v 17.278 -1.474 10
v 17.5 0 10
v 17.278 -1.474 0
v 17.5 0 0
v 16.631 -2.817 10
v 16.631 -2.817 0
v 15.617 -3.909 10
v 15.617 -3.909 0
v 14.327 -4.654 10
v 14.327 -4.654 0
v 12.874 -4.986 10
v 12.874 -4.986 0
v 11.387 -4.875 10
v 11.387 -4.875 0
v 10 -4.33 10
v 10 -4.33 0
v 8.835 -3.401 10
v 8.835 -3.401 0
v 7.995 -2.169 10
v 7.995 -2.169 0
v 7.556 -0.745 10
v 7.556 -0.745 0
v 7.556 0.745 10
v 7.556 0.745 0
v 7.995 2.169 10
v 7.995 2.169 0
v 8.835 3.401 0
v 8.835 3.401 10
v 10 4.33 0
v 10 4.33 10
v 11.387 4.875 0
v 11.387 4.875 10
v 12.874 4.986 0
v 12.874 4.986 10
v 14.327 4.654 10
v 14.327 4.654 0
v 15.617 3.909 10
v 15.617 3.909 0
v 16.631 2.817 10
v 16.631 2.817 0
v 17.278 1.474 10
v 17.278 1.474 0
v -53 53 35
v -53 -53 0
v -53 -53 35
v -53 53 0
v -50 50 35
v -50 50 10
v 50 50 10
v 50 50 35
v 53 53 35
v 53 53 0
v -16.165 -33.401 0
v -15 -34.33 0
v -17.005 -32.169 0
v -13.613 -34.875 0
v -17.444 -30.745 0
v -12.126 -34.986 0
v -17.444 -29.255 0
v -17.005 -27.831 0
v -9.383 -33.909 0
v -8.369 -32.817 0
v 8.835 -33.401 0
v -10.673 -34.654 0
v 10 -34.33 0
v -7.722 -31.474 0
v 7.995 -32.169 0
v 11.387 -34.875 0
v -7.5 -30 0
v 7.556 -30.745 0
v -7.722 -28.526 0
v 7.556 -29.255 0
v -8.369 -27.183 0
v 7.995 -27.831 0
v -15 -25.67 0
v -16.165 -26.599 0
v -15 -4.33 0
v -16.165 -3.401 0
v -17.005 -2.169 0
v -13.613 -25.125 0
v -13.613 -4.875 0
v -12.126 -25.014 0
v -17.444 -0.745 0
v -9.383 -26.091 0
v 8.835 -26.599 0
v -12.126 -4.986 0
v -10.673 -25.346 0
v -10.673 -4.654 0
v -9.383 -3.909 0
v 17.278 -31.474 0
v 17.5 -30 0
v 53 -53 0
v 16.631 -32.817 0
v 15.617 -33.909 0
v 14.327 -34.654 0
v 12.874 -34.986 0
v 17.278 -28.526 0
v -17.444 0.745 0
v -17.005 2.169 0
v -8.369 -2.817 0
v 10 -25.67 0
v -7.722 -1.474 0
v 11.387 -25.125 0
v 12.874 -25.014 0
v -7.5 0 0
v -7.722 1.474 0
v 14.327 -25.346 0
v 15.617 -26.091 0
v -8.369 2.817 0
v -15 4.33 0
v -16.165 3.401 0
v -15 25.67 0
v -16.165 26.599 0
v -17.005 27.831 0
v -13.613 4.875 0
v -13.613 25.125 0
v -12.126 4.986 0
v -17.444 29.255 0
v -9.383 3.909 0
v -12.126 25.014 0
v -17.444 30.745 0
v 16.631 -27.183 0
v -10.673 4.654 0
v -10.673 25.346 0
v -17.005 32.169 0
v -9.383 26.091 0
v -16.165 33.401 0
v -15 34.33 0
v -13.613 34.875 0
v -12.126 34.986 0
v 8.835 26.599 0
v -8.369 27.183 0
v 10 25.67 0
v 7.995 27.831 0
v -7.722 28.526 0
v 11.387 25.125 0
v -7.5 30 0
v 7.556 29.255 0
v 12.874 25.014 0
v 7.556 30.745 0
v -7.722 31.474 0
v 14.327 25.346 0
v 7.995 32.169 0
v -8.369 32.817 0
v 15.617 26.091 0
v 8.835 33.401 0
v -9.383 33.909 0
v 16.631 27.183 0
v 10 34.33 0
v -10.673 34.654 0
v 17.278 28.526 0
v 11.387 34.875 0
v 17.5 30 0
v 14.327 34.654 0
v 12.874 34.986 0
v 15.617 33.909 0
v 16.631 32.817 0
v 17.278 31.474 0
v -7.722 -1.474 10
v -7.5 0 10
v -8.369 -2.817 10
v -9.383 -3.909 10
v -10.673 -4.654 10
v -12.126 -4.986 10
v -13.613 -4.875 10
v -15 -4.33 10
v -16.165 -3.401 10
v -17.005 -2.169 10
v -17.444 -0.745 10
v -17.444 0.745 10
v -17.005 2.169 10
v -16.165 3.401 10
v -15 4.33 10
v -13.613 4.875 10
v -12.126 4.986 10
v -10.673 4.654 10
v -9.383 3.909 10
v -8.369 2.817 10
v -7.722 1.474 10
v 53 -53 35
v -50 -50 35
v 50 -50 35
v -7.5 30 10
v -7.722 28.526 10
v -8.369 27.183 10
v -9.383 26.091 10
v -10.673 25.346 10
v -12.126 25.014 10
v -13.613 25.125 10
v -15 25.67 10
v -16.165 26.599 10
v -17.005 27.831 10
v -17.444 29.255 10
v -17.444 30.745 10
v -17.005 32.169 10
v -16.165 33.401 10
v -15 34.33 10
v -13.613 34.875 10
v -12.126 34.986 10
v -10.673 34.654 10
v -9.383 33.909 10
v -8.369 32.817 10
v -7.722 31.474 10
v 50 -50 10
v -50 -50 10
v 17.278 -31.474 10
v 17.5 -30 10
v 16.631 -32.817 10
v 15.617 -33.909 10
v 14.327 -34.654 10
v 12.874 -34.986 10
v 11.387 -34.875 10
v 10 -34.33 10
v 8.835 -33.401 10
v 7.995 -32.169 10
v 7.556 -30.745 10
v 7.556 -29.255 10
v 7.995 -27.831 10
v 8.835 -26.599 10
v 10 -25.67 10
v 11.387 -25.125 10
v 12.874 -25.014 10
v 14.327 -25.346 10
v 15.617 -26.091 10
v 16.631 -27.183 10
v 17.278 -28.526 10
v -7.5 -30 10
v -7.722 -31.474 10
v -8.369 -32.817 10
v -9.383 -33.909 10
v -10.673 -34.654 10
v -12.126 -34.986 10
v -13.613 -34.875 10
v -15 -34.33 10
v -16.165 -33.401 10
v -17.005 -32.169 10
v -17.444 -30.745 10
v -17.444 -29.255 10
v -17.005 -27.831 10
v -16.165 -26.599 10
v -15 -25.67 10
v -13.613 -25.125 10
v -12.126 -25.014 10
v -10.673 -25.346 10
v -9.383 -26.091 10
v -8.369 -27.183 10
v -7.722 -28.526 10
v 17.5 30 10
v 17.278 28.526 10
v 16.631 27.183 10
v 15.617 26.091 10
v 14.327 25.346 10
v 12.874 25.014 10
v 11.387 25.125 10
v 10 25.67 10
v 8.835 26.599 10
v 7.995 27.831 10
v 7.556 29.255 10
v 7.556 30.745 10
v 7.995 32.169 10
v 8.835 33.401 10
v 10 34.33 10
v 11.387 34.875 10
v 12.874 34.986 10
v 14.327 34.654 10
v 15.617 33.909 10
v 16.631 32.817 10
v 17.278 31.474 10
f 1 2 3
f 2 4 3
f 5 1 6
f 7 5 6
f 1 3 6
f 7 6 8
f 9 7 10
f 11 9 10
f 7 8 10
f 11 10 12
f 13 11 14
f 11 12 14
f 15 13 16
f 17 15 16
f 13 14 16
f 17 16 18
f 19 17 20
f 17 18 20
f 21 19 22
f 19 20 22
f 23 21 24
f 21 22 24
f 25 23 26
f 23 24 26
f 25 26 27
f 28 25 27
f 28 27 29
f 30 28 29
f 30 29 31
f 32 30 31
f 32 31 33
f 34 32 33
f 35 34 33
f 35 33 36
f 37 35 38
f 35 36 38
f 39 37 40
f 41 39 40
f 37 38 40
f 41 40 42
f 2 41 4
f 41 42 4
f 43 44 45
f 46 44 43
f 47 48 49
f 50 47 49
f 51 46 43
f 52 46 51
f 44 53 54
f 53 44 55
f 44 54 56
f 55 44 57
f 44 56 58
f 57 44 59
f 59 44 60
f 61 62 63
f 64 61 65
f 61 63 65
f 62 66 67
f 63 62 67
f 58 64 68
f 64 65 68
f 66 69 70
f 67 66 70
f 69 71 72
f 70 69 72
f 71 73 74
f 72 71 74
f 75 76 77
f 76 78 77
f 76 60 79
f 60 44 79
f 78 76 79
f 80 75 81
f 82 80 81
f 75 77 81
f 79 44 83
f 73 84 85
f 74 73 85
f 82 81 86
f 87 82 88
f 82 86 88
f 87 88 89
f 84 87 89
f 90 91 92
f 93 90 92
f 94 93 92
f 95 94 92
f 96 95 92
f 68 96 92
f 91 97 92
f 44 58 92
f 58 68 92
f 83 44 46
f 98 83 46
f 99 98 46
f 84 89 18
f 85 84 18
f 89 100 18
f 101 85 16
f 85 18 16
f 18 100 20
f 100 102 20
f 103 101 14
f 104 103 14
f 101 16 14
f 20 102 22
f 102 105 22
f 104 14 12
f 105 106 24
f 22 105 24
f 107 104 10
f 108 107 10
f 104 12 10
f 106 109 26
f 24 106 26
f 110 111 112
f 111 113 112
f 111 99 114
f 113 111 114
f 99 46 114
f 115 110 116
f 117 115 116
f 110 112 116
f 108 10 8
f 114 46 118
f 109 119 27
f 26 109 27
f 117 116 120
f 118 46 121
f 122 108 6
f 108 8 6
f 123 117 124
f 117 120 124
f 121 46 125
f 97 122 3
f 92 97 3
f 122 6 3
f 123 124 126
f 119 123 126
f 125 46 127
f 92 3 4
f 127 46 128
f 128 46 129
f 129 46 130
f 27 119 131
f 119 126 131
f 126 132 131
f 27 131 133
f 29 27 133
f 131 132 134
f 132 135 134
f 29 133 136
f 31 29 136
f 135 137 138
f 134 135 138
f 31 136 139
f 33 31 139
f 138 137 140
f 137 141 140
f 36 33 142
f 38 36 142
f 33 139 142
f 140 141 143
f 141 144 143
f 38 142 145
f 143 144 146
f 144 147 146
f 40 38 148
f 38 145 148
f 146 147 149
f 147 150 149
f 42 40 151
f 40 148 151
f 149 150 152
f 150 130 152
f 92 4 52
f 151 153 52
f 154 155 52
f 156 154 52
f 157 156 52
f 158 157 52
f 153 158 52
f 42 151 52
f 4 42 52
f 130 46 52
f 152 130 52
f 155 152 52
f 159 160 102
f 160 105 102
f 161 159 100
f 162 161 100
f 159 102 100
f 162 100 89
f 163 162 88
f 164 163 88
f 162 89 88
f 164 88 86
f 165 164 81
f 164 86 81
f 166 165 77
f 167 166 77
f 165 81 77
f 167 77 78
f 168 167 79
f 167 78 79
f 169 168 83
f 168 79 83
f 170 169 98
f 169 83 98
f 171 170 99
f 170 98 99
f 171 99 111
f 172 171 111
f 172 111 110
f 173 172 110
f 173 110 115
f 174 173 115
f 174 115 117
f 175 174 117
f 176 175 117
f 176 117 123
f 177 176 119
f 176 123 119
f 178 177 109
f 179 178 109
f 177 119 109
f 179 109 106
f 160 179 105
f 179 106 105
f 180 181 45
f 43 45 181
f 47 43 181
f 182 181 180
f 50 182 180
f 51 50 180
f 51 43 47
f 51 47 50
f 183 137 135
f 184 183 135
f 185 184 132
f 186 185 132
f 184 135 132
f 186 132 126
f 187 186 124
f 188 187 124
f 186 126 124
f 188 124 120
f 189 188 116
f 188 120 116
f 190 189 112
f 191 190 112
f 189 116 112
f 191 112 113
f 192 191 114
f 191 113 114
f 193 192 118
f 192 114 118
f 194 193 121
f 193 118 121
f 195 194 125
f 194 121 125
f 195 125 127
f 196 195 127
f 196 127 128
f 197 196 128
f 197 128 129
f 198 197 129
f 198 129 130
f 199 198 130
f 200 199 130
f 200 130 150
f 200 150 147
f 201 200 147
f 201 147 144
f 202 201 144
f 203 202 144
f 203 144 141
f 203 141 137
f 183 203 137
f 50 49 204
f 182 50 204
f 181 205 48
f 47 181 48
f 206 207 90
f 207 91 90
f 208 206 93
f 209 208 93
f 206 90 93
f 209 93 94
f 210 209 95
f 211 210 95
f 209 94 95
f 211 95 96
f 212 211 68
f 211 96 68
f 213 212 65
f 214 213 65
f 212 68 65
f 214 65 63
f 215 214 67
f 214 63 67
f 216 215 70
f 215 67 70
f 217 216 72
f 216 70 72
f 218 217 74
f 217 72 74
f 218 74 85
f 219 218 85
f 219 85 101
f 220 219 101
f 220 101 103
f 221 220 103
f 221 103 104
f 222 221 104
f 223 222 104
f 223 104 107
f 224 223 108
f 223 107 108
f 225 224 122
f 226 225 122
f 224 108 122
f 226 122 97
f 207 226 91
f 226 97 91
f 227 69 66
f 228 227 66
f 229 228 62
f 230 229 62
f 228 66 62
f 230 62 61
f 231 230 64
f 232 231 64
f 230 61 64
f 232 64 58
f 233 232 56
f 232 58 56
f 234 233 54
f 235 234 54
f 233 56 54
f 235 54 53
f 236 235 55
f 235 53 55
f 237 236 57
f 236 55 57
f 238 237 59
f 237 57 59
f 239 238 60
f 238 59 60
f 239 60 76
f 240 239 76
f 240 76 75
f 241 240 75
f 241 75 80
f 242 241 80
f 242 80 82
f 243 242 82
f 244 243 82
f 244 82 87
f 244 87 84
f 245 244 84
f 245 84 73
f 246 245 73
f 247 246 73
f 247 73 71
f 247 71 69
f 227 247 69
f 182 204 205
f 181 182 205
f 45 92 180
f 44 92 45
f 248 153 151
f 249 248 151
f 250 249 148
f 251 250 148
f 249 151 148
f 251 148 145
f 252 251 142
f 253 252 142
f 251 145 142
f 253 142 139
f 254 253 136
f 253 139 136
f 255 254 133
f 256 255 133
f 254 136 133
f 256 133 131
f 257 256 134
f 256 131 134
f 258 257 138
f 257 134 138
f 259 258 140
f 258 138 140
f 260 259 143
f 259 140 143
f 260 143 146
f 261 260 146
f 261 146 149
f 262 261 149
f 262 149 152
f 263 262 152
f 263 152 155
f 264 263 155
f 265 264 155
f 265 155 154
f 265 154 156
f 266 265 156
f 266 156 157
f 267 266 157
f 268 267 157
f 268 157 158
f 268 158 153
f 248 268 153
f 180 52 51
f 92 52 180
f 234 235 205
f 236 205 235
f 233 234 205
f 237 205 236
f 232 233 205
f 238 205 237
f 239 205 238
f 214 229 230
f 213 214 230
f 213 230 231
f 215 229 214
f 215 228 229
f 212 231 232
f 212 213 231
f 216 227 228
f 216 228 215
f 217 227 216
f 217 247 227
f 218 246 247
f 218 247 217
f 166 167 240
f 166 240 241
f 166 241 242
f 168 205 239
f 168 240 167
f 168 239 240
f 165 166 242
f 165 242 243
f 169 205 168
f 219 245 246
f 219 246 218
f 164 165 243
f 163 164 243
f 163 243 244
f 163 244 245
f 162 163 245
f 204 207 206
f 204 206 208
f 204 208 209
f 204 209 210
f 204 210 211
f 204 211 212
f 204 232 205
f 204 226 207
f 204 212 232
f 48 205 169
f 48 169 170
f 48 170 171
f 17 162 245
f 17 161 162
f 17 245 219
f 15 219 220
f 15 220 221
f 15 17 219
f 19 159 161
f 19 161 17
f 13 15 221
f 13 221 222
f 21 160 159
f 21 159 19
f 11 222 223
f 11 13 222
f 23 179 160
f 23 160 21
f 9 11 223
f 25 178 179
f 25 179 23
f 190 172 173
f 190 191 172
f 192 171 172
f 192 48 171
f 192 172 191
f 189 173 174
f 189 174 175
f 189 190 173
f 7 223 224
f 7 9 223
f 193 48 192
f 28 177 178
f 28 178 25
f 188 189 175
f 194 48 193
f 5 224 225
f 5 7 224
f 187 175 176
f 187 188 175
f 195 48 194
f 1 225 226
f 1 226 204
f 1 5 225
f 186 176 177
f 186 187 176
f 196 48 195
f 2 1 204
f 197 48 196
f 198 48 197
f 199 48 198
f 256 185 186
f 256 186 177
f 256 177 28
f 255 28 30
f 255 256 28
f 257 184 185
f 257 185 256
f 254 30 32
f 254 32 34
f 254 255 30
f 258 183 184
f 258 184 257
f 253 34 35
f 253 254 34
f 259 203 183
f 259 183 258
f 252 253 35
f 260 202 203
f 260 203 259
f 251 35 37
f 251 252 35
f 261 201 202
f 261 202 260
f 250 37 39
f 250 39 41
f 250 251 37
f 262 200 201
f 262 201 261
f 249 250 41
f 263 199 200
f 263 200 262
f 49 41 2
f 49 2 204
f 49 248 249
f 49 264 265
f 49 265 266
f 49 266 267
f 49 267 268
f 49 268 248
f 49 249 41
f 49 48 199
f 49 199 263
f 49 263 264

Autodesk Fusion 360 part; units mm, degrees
sketch "Sketch1" plane through (0, 0, 0) normal (0, 0, 1) x (1, 0, 0)
  line L0 (-50, 50) -> (50, 50)
  line L1 (50, 50) -> (50, -50)
  line L2 (50, -50) -> (-50, -50)
  line L3 (-50, -50) -> (-50, 50)
  line L4 (-50, 50) -> (50, -50) construction
  line L5 (50, 50) -> (-50, -50) construction
  line L6 (53, 53) -> (53, -53)
  line L7 (53, -53) -> (-53, -53)
  line L8 (-53, -53) -> (-53, 53)
  line L9 (-53, 53) -> (53, 53)
  dimension "d1" = -3
extrude "Extrude1" add sketch "Sketch1" along normal blind 35
extrude "Extrude2" add sketch "Sketch1" along normal blind 10 contours L0 L1 L2 L3
sketch "Sketch3" plane through (0, 0, 0) normal (0, 0, -1) x (1, 0, 0)
  line L0 (-53, 53) -> (-53, -53)
  line L1 (-53, -53) -> (53, -53)
  line L2 (53, -53) -> (53, 53)
  line L3 (53, 53) -> (-53, 53)
  circle A0 centre (-12.5, 0) radius 5
  circle A1 centre (12.5, 0) radius 5
  circle A2 centre (-12.5, 30) radius 5
  circle A3 centre (12.5, 30) radius 5
  circle A4 centre (-12.5, -30) radius 5
  circle A5 centre (12.5, -30) radius 5
  dimension "d6" = 10
  dimension "d7" = 10
  dimension "d8" = 25
  dimension "d9" = 12.5
  dimension "d12" = 0
  dimension "d13" = 30
  dimension "d16" = 0
  dimension "d17" = -30
extrude "Extrude3" cut sketch "Sketch3" against normal blind 10 contours A0 | A1 | A2 | A3 | A4 | A5
